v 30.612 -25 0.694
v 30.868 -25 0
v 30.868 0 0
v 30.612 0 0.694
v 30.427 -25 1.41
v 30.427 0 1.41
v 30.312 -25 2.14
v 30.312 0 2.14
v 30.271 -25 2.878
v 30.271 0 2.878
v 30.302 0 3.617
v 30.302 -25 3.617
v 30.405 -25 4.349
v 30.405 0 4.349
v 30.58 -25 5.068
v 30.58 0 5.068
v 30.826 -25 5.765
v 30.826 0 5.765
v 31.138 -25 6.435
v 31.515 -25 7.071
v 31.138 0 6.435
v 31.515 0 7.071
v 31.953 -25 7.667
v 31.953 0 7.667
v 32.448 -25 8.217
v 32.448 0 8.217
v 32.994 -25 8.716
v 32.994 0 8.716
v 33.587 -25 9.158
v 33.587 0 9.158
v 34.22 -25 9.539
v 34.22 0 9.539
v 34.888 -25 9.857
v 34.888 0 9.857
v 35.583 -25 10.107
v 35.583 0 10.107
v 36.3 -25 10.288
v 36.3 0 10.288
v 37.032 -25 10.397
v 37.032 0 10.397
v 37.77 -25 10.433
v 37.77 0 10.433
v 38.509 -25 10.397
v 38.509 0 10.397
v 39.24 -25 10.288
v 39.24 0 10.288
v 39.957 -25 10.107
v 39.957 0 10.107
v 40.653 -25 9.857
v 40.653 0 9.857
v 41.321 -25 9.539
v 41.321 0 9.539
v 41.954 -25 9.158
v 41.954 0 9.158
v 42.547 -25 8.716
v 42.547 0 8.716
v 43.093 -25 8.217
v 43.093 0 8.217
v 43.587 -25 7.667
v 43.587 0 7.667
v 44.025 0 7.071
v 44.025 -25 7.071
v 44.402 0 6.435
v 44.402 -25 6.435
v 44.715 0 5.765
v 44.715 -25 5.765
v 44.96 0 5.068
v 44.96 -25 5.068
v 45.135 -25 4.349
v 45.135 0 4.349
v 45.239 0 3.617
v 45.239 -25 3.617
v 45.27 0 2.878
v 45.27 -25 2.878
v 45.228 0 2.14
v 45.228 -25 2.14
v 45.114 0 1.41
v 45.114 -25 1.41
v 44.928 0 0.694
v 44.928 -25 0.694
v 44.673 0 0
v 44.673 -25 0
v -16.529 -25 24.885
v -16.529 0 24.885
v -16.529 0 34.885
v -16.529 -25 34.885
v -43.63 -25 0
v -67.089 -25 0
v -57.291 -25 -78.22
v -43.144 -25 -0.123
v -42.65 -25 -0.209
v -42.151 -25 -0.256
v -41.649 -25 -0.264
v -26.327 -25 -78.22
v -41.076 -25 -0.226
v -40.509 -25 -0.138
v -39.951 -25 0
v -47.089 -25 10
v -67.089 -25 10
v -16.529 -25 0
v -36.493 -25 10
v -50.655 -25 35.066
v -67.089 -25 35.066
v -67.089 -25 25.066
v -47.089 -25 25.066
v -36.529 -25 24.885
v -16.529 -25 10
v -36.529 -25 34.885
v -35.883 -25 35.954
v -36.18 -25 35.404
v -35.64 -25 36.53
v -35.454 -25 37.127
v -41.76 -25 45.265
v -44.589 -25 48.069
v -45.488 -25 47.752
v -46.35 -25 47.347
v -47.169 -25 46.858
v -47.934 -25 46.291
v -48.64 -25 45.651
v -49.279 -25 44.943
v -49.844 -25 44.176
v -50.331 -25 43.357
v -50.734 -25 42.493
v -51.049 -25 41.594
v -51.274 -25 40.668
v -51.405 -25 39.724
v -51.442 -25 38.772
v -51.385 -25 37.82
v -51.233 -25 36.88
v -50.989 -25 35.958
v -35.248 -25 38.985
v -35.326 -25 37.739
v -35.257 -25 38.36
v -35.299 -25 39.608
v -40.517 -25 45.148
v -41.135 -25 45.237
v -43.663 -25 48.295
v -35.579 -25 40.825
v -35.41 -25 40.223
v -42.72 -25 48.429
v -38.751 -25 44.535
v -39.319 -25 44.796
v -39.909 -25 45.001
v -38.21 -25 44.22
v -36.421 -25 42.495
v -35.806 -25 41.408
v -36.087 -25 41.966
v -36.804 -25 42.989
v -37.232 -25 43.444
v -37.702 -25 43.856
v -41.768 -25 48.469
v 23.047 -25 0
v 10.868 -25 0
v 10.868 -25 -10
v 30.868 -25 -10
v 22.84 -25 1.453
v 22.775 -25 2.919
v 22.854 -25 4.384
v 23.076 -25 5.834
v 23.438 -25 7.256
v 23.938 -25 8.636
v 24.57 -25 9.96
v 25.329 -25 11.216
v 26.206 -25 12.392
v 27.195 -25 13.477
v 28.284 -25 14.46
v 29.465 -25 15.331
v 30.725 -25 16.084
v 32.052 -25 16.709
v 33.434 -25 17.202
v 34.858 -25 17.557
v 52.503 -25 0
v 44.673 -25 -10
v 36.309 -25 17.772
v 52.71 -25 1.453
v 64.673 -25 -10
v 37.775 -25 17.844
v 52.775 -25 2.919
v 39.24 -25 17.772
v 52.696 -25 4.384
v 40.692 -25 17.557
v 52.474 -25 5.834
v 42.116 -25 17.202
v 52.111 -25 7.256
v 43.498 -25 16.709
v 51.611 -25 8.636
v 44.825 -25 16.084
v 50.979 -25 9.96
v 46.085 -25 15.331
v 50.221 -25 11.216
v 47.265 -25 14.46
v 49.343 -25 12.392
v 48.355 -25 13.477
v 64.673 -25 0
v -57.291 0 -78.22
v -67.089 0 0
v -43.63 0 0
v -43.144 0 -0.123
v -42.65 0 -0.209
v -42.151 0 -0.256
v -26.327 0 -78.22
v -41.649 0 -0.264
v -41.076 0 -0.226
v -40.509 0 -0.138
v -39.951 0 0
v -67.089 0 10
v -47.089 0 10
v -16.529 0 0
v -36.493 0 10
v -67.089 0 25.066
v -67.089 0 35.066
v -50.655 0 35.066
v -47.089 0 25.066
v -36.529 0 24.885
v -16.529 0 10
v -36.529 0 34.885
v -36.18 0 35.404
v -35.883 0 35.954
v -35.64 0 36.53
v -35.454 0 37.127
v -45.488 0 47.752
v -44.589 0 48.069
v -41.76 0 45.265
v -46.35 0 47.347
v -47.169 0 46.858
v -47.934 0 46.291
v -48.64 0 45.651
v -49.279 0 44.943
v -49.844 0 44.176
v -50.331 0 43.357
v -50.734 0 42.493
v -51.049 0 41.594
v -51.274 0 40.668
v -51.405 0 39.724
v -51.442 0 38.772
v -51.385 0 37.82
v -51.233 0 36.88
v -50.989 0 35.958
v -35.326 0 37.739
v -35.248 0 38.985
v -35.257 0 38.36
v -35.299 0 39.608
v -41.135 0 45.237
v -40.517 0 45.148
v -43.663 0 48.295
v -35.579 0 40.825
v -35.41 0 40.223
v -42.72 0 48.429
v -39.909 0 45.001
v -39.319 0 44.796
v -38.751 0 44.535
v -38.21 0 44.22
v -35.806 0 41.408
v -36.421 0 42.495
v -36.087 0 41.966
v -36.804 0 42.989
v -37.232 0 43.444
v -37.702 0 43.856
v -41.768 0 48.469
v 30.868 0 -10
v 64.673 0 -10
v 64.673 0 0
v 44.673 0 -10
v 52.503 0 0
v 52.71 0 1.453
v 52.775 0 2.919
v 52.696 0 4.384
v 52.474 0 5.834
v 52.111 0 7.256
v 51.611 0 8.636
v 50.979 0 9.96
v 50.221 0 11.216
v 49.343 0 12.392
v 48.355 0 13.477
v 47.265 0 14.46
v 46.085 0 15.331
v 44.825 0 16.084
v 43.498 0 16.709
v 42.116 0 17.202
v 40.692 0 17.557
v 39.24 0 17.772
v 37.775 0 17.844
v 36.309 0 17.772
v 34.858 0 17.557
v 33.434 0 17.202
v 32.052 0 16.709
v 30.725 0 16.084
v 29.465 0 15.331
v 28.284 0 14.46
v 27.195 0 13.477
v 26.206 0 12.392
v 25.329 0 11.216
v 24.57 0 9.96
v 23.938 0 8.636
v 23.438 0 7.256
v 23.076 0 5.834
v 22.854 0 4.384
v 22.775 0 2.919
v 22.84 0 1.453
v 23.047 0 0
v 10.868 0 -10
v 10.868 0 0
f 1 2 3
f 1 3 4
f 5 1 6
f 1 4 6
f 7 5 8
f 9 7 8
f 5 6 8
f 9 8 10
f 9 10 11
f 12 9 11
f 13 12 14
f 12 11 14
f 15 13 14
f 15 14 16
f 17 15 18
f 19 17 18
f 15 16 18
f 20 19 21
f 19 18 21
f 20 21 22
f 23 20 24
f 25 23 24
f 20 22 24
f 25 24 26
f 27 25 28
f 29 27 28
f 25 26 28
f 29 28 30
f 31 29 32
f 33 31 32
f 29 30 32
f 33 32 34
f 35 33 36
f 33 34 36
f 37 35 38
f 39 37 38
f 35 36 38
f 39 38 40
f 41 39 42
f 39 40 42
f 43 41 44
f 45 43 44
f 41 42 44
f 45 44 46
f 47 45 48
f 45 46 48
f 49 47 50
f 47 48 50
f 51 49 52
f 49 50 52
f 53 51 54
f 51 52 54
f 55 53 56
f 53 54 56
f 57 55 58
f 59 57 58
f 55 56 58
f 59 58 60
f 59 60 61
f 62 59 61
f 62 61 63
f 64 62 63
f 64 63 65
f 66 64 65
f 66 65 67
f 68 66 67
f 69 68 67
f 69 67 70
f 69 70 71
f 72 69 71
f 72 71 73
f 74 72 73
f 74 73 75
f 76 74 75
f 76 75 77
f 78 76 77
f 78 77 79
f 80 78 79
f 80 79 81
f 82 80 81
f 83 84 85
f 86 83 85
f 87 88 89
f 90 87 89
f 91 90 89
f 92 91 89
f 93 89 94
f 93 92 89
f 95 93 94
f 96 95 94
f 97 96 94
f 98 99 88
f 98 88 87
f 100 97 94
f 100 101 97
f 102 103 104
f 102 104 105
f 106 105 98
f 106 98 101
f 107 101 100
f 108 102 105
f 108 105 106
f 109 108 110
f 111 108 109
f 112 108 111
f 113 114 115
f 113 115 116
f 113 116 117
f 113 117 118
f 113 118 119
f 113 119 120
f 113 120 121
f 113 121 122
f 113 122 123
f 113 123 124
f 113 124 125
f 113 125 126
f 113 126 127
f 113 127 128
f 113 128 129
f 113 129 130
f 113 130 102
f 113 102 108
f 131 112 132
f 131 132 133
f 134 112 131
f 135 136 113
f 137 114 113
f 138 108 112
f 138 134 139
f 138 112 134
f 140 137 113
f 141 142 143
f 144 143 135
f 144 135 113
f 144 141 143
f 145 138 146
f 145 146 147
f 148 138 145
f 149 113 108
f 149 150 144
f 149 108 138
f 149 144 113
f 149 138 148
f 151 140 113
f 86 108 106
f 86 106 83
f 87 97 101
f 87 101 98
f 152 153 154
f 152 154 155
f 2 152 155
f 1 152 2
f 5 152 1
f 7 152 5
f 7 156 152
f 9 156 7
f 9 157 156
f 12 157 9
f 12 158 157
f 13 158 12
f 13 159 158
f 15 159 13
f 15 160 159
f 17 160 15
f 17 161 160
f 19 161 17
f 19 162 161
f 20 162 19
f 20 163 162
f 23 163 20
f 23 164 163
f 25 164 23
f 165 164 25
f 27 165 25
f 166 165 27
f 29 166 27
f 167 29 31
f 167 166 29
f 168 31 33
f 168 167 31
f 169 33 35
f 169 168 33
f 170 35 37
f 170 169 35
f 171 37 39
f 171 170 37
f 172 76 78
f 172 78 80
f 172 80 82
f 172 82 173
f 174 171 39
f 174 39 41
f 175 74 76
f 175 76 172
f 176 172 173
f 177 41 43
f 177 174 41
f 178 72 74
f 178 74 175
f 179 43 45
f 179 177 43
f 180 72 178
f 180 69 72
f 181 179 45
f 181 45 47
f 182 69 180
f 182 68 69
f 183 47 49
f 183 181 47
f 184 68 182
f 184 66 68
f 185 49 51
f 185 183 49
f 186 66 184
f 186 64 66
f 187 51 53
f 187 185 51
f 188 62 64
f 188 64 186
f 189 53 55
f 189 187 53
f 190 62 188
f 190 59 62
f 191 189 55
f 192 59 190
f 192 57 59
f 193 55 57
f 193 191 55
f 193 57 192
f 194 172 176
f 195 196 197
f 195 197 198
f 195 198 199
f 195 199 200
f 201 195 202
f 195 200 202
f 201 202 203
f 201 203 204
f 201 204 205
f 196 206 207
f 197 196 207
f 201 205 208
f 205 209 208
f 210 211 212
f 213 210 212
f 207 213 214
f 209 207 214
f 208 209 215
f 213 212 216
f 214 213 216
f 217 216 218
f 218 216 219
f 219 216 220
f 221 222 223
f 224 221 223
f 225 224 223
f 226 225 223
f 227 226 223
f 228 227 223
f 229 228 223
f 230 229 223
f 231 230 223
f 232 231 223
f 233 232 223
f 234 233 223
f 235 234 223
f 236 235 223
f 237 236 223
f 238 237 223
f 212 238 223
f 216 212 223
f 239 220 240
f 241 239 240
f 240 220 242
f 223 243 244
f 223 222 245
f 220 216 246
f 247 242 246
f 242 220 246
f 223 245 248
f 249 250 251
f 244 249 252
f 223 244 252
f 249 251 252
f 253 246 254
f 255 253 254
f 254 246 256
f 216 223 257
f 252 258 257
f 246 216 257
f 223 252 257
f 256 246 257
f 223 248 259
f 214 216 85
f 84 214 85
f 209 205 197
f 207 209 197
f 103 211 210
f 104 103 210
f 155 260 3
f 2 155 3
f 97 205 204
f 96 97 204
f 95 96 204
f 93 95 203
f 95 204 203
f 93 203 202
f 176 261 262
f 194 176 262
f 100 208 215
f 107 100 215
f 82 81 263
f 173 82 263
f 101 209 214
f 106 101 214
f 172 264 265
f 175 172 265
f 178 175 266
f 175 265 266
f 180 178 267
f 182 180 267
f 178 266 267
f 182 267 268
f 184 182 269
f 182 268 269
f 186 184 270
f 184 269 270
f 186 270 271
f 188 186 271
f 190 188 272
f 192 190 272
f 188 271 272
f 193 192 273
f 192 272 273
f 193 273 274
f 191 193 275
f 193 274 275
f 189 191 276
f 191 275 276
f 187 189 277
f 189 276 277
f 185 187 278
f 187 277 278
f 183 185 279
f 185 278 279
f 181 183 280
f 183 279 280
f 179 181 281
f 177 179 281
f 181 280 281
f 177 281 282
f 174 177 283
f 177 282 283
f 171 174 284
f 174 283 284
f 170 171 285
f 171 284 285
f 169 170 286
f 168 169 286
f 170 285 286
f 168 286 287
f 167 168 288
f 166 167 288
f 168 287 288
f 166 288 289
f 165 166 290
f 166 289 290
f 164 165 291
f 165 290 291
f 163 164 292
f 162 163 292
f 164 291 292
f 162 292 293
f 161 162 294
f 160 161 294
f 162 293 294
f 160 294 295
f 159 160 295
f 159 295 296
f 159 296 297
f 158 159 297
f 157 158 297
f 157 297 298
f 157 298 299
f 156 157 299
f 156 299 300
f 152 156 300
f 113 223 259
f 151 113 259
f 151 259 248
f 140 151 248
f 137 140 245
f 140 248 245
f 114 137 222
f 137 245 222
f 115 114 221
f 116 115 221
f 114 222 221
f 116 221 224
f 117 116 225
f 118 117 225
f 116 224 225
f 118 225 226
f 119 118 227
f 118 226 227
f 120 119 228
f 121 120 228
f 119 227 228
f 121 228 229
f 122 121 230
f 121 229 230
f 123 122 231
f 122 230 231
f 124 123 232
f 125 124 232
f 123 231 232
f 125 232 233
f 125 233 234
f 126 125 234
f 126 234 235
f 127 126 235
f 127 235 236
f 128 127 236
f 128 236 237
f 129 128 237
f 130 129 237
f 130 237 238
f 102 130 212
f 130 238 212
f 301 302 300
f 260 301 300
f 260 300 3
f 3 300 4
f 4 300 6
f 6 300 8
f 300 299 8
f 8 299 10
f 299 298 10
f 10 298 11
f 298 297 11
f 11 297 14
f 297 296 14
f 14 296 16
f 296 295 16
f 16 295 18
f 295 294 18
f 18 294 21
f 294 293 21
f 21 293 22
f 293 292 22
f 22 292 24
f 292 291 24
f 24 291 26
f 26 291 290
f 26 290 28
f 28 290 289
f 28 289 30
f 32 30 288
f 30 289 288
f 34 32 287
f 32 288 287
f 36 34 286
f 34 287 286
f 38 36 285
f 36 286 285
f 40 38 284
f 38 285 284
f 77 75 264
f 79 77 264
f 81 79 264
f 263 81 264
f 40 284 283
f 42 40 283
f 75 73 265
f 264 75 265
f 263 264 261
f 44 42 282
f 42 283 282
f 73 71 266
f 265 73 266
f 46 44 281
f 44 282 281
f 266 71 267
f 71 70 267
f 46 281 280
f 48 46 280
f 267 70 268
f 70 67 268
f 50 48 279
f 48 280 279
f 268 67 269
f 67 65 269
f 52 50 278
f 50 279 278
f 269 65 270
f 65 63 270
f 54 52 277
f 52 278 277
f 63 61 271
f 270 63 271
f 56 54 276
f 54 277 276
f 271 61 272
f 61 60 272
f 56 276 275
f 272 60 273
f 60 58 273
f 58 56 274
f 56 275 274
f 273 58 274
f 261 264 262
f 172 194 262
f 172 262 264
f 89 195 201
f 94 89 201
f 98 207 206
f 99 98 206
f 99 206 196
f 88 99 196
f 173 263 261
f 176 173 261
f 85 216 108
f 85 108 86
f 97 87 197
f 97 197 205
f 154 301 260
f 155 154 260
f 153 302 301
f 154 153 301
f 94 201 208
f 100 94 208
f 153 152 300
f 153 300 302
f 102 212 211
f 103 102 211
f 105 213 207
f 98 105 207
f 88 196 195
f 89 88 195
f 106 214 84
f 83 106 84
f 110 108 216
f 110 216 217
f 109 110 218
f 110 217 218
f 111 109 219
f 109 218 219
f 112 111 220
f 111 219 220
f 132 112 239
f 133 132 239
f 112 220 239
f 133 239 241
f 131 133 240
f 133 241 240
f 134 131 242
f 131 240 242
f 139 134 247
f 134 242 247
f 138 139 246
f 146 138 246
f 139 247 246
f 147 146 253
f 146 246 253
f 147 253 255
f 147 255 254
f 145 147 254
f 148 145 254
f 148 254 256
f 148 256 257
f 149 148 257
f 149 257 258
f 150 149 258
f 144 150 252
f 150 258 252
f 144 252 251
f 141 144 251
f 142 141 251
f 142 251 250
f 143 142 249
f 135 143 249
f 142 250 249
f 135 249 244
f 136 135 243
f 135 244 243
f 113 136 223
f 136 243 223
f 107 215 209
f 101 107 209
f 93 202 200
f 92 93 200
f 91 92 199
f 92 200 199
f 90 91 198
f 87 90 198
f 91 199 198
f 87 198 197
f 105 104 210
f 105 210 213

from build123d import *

# Parameters (mm, degrees)
F0_W     = 20
F0_H     = 10
F1_DEPTH = 25
F2_DEPTH = 25


with BuildPart() as f1:
    # F0 (on Front) → F1 (new body)
    with BuildSketch(Plane.XZ):
        Polygon((-47.0889342741, 25.065948941), (-47.0889342741, 35.065948941), (-50.6550110877, 35.065948941), (-67.0889342741, 35.065948941), (-67.0889342741, 25.065948941), align=None)
        with BuildLine():
            ThreePointArc((-47.0889342741, 35.065948941), (-47.505184706, 41.7751692334), (-41.7599575708, 45.2650498216))
            Line((-41.7599575708, 45.2650498216), (-41.7677386266, 48.4685200284))
            ThreePointArc((-41.7677386266, 48.4685200284), (-49.8443880857, 44.1762930308), (-50.6550110877, 35.065948941))
            Line((-50.6550110877, 35.065948941), (-47.0889342741, 35.065948941))
        make_face()
        with BuildLine():
            Line((-41.7441694692, 38.7650689958), (-41.7599575708, 45.2650498216))
            ThreePointArc((-41.7599575708, 45.2650498216), (-47.505184706, 41.7751692334), (-47.0889342741, 35.065948941))
            Line((-47.0889342741, 35.065948941), (-47.0889342741, 25.065948941))
            Line((-47.0889342741, 25.065948941), (-41.7106717768, 24.9740278866))
            Line((-41.7106717768, 24.9740278866), (-41.7441694692, 38.7650689958))
        make_face()
        with BuildLine():
            Line((-36.5289342741, 24.8854656836), (-36.5289342741, 34.8854656836))
            ThreePointArc((-36.5289342741, 34.8854656836), (-35.9396450064, 41.6903887665), (-41.7599575708, 45.2650498216))
            Line((-41.7599575708, 45.2650498216), (-41.7441694692, 38.7650689958))
            Line((-41.7441694692, 38.7650689958), (-41.7106717768, 24.9740278866))
            Line((-41.7106717768, 24.9740278866), (-36.5289342741, 24.8854656836))
        make_face()
        with Locations((-26.5289342741, 29.8854656836)):
            Rectangle(F0_W, F0_H)
        with BuildLine():
            Line((-41.6500112147, 0), (-41.6743006735, 10))
            Line((-41.6743006735, 10), (-47.0889342741, 10))
            ThreePointArc((-47.0889342741, 10), (-47.933803617, 4.1096526449), (-43.6302293689, 0))
            Line((-43.6302293689, 0), (-41.6500112147, 0))
        make_face()
        with BuildLine():
            ThreePointArc((-39.9514831888, 0), (-35.6479089408, 4.1096526449), (-36.4927782836, 10))
            Line((-36.4927782836, 10), (-41.6743006735, 10))
            Line((-41.6743006735, 10), (-41.6500112147, 0))
            Line((-41.6500112147, 0), (-39.9514831888, 0))
        make_face()
        Polygon((-41.6743006735, 10), (-41.7106717768, 24.9740278866), (-47.0889342741, 25.065948941), (-47.0889342741, 10), align=None)
        Polygon((-36.4927782836, 10), (-36.5289342741, 24.8854656836), (-41.7106717768, 24.9740278866), (-41.6743006735, 10), align=None)
        with BuildLine():
            Line((-16.5289342741, 10), (-36.4927782836, 10))
            ThreePointArc((-36.4927782836, 10), (-35.6479089408, 4.1096526449), (-39.9514831888, 0))
            Line((-39.9514831888, 0), (-26.3268932452, 0))
            Line((-26.3268932452, 0), (-16.5289342741, 10))
        make_face()
        Polygon((-26.3268932452, -78.22), (-16.5289342741, 0), (-26.3268932452, 0), align=None)
        with BuildLine():
            ThreePointArc((-43.6302293689, 0), (-47.933803617, 4.1096526449), (-47.0889342741, 10))
            Line((-47.0889342741, 10), (-67.0889342741, 10))
            Line((-67.0889342741, 10), (-57.290975303, 0))
            Line((-57.290975303, 0), (-43.6302293689, 0))
        make_face()
        Polygon((-57.290975303, 0), (-67.0889342741, 10), (-67.0889342741, 0), align=None)
        Polygon((-16.5289342741, 0), (-16.5289342741, 10), (-26.3268932452, 0), align=None)
        Polygon((-57.290975303, 0), (-67.0889342741, 0), (-57.290975303, -78.22), align=None)
        with BuildLine():
            Line((-41.6330927772, -6.9653415034), (-41.6493696255, -0.264143081))
            ThreePointArc((-41.6493696255, -0.264143081), (-42.6500113753, -0.2086523777), (-43.6302293689, 0))
            Line((-43.6302293689, 0), (-57.290975303, 0))
            Line((-57.290975303, 0), (-57.290975303, -78.22))
            Line((-57.290975303, -78.22), (-41.6330927772, -78.22))
            Line((-41.6330927772, -78.22), (-41.6330927772, -35.4483425617))
            Line((-41.6330927772, -35.4483425617), (-41.6330927772, -6.9653415034))
        make_face()
        with BuildLine():
            Line((-26.3268932452, 0), (-39.9514831888, 0))
            ThreePointArc((-39.9514831888, 0), (-40.7916594901, -0.1884244437), (-41.6493696255, -0.264143081))
            Line((-41.6493696255, -0.264143081), (-41.6330927772, -6.9653415034))
            Line((-41.6330927772, -6.9653415034), (-41.6330927772, -35.4483425617))
            Line((-41.6330927772, -35.4483425617), (-41.6330927772, -78.22))
            Line((-41.6330927772, -78.22), (-26.3268932452, -78.22))
            Line((-26.3268932452, -78.22), (-26.3268932452, 0))
        make_face()
    extrude(amount=F1_DEPTH)


with BuildPart() as f2:
    # F0 (on Front) → F2 (new body)
    with BuildSketch(Plane.XZ):
        Polygon((30.8676548302, -10), (30.8676548302, 0), (23.0468998015, 0), (10.8676548302, 0), (10.8676548302, -10), align=None)
        with BuildLine():
            ThreePointArc((30.8676548302, 0), (37.7703162591, 10.4331323187), (44.6729776879, 0))
            Line((44.6729776879, 0), (52.5027990743, 0))
            ThreePointArc((52.5027990743, 0), (37.7748494379, 17.8438529333), (23.0468998015, 0))
            Line((23.0468998015, 0), (30.8676548302, 0))
        make_face()
        Polygon((52.5027990743, 0), (44.6729776879, 0), (44.6729776879, -10), (64.6729776879, -10), (64.6729776879, 0), align=None)
    extrude(amount=F2_DEPTH)


solid = Compound([f1.part, f2.part])
